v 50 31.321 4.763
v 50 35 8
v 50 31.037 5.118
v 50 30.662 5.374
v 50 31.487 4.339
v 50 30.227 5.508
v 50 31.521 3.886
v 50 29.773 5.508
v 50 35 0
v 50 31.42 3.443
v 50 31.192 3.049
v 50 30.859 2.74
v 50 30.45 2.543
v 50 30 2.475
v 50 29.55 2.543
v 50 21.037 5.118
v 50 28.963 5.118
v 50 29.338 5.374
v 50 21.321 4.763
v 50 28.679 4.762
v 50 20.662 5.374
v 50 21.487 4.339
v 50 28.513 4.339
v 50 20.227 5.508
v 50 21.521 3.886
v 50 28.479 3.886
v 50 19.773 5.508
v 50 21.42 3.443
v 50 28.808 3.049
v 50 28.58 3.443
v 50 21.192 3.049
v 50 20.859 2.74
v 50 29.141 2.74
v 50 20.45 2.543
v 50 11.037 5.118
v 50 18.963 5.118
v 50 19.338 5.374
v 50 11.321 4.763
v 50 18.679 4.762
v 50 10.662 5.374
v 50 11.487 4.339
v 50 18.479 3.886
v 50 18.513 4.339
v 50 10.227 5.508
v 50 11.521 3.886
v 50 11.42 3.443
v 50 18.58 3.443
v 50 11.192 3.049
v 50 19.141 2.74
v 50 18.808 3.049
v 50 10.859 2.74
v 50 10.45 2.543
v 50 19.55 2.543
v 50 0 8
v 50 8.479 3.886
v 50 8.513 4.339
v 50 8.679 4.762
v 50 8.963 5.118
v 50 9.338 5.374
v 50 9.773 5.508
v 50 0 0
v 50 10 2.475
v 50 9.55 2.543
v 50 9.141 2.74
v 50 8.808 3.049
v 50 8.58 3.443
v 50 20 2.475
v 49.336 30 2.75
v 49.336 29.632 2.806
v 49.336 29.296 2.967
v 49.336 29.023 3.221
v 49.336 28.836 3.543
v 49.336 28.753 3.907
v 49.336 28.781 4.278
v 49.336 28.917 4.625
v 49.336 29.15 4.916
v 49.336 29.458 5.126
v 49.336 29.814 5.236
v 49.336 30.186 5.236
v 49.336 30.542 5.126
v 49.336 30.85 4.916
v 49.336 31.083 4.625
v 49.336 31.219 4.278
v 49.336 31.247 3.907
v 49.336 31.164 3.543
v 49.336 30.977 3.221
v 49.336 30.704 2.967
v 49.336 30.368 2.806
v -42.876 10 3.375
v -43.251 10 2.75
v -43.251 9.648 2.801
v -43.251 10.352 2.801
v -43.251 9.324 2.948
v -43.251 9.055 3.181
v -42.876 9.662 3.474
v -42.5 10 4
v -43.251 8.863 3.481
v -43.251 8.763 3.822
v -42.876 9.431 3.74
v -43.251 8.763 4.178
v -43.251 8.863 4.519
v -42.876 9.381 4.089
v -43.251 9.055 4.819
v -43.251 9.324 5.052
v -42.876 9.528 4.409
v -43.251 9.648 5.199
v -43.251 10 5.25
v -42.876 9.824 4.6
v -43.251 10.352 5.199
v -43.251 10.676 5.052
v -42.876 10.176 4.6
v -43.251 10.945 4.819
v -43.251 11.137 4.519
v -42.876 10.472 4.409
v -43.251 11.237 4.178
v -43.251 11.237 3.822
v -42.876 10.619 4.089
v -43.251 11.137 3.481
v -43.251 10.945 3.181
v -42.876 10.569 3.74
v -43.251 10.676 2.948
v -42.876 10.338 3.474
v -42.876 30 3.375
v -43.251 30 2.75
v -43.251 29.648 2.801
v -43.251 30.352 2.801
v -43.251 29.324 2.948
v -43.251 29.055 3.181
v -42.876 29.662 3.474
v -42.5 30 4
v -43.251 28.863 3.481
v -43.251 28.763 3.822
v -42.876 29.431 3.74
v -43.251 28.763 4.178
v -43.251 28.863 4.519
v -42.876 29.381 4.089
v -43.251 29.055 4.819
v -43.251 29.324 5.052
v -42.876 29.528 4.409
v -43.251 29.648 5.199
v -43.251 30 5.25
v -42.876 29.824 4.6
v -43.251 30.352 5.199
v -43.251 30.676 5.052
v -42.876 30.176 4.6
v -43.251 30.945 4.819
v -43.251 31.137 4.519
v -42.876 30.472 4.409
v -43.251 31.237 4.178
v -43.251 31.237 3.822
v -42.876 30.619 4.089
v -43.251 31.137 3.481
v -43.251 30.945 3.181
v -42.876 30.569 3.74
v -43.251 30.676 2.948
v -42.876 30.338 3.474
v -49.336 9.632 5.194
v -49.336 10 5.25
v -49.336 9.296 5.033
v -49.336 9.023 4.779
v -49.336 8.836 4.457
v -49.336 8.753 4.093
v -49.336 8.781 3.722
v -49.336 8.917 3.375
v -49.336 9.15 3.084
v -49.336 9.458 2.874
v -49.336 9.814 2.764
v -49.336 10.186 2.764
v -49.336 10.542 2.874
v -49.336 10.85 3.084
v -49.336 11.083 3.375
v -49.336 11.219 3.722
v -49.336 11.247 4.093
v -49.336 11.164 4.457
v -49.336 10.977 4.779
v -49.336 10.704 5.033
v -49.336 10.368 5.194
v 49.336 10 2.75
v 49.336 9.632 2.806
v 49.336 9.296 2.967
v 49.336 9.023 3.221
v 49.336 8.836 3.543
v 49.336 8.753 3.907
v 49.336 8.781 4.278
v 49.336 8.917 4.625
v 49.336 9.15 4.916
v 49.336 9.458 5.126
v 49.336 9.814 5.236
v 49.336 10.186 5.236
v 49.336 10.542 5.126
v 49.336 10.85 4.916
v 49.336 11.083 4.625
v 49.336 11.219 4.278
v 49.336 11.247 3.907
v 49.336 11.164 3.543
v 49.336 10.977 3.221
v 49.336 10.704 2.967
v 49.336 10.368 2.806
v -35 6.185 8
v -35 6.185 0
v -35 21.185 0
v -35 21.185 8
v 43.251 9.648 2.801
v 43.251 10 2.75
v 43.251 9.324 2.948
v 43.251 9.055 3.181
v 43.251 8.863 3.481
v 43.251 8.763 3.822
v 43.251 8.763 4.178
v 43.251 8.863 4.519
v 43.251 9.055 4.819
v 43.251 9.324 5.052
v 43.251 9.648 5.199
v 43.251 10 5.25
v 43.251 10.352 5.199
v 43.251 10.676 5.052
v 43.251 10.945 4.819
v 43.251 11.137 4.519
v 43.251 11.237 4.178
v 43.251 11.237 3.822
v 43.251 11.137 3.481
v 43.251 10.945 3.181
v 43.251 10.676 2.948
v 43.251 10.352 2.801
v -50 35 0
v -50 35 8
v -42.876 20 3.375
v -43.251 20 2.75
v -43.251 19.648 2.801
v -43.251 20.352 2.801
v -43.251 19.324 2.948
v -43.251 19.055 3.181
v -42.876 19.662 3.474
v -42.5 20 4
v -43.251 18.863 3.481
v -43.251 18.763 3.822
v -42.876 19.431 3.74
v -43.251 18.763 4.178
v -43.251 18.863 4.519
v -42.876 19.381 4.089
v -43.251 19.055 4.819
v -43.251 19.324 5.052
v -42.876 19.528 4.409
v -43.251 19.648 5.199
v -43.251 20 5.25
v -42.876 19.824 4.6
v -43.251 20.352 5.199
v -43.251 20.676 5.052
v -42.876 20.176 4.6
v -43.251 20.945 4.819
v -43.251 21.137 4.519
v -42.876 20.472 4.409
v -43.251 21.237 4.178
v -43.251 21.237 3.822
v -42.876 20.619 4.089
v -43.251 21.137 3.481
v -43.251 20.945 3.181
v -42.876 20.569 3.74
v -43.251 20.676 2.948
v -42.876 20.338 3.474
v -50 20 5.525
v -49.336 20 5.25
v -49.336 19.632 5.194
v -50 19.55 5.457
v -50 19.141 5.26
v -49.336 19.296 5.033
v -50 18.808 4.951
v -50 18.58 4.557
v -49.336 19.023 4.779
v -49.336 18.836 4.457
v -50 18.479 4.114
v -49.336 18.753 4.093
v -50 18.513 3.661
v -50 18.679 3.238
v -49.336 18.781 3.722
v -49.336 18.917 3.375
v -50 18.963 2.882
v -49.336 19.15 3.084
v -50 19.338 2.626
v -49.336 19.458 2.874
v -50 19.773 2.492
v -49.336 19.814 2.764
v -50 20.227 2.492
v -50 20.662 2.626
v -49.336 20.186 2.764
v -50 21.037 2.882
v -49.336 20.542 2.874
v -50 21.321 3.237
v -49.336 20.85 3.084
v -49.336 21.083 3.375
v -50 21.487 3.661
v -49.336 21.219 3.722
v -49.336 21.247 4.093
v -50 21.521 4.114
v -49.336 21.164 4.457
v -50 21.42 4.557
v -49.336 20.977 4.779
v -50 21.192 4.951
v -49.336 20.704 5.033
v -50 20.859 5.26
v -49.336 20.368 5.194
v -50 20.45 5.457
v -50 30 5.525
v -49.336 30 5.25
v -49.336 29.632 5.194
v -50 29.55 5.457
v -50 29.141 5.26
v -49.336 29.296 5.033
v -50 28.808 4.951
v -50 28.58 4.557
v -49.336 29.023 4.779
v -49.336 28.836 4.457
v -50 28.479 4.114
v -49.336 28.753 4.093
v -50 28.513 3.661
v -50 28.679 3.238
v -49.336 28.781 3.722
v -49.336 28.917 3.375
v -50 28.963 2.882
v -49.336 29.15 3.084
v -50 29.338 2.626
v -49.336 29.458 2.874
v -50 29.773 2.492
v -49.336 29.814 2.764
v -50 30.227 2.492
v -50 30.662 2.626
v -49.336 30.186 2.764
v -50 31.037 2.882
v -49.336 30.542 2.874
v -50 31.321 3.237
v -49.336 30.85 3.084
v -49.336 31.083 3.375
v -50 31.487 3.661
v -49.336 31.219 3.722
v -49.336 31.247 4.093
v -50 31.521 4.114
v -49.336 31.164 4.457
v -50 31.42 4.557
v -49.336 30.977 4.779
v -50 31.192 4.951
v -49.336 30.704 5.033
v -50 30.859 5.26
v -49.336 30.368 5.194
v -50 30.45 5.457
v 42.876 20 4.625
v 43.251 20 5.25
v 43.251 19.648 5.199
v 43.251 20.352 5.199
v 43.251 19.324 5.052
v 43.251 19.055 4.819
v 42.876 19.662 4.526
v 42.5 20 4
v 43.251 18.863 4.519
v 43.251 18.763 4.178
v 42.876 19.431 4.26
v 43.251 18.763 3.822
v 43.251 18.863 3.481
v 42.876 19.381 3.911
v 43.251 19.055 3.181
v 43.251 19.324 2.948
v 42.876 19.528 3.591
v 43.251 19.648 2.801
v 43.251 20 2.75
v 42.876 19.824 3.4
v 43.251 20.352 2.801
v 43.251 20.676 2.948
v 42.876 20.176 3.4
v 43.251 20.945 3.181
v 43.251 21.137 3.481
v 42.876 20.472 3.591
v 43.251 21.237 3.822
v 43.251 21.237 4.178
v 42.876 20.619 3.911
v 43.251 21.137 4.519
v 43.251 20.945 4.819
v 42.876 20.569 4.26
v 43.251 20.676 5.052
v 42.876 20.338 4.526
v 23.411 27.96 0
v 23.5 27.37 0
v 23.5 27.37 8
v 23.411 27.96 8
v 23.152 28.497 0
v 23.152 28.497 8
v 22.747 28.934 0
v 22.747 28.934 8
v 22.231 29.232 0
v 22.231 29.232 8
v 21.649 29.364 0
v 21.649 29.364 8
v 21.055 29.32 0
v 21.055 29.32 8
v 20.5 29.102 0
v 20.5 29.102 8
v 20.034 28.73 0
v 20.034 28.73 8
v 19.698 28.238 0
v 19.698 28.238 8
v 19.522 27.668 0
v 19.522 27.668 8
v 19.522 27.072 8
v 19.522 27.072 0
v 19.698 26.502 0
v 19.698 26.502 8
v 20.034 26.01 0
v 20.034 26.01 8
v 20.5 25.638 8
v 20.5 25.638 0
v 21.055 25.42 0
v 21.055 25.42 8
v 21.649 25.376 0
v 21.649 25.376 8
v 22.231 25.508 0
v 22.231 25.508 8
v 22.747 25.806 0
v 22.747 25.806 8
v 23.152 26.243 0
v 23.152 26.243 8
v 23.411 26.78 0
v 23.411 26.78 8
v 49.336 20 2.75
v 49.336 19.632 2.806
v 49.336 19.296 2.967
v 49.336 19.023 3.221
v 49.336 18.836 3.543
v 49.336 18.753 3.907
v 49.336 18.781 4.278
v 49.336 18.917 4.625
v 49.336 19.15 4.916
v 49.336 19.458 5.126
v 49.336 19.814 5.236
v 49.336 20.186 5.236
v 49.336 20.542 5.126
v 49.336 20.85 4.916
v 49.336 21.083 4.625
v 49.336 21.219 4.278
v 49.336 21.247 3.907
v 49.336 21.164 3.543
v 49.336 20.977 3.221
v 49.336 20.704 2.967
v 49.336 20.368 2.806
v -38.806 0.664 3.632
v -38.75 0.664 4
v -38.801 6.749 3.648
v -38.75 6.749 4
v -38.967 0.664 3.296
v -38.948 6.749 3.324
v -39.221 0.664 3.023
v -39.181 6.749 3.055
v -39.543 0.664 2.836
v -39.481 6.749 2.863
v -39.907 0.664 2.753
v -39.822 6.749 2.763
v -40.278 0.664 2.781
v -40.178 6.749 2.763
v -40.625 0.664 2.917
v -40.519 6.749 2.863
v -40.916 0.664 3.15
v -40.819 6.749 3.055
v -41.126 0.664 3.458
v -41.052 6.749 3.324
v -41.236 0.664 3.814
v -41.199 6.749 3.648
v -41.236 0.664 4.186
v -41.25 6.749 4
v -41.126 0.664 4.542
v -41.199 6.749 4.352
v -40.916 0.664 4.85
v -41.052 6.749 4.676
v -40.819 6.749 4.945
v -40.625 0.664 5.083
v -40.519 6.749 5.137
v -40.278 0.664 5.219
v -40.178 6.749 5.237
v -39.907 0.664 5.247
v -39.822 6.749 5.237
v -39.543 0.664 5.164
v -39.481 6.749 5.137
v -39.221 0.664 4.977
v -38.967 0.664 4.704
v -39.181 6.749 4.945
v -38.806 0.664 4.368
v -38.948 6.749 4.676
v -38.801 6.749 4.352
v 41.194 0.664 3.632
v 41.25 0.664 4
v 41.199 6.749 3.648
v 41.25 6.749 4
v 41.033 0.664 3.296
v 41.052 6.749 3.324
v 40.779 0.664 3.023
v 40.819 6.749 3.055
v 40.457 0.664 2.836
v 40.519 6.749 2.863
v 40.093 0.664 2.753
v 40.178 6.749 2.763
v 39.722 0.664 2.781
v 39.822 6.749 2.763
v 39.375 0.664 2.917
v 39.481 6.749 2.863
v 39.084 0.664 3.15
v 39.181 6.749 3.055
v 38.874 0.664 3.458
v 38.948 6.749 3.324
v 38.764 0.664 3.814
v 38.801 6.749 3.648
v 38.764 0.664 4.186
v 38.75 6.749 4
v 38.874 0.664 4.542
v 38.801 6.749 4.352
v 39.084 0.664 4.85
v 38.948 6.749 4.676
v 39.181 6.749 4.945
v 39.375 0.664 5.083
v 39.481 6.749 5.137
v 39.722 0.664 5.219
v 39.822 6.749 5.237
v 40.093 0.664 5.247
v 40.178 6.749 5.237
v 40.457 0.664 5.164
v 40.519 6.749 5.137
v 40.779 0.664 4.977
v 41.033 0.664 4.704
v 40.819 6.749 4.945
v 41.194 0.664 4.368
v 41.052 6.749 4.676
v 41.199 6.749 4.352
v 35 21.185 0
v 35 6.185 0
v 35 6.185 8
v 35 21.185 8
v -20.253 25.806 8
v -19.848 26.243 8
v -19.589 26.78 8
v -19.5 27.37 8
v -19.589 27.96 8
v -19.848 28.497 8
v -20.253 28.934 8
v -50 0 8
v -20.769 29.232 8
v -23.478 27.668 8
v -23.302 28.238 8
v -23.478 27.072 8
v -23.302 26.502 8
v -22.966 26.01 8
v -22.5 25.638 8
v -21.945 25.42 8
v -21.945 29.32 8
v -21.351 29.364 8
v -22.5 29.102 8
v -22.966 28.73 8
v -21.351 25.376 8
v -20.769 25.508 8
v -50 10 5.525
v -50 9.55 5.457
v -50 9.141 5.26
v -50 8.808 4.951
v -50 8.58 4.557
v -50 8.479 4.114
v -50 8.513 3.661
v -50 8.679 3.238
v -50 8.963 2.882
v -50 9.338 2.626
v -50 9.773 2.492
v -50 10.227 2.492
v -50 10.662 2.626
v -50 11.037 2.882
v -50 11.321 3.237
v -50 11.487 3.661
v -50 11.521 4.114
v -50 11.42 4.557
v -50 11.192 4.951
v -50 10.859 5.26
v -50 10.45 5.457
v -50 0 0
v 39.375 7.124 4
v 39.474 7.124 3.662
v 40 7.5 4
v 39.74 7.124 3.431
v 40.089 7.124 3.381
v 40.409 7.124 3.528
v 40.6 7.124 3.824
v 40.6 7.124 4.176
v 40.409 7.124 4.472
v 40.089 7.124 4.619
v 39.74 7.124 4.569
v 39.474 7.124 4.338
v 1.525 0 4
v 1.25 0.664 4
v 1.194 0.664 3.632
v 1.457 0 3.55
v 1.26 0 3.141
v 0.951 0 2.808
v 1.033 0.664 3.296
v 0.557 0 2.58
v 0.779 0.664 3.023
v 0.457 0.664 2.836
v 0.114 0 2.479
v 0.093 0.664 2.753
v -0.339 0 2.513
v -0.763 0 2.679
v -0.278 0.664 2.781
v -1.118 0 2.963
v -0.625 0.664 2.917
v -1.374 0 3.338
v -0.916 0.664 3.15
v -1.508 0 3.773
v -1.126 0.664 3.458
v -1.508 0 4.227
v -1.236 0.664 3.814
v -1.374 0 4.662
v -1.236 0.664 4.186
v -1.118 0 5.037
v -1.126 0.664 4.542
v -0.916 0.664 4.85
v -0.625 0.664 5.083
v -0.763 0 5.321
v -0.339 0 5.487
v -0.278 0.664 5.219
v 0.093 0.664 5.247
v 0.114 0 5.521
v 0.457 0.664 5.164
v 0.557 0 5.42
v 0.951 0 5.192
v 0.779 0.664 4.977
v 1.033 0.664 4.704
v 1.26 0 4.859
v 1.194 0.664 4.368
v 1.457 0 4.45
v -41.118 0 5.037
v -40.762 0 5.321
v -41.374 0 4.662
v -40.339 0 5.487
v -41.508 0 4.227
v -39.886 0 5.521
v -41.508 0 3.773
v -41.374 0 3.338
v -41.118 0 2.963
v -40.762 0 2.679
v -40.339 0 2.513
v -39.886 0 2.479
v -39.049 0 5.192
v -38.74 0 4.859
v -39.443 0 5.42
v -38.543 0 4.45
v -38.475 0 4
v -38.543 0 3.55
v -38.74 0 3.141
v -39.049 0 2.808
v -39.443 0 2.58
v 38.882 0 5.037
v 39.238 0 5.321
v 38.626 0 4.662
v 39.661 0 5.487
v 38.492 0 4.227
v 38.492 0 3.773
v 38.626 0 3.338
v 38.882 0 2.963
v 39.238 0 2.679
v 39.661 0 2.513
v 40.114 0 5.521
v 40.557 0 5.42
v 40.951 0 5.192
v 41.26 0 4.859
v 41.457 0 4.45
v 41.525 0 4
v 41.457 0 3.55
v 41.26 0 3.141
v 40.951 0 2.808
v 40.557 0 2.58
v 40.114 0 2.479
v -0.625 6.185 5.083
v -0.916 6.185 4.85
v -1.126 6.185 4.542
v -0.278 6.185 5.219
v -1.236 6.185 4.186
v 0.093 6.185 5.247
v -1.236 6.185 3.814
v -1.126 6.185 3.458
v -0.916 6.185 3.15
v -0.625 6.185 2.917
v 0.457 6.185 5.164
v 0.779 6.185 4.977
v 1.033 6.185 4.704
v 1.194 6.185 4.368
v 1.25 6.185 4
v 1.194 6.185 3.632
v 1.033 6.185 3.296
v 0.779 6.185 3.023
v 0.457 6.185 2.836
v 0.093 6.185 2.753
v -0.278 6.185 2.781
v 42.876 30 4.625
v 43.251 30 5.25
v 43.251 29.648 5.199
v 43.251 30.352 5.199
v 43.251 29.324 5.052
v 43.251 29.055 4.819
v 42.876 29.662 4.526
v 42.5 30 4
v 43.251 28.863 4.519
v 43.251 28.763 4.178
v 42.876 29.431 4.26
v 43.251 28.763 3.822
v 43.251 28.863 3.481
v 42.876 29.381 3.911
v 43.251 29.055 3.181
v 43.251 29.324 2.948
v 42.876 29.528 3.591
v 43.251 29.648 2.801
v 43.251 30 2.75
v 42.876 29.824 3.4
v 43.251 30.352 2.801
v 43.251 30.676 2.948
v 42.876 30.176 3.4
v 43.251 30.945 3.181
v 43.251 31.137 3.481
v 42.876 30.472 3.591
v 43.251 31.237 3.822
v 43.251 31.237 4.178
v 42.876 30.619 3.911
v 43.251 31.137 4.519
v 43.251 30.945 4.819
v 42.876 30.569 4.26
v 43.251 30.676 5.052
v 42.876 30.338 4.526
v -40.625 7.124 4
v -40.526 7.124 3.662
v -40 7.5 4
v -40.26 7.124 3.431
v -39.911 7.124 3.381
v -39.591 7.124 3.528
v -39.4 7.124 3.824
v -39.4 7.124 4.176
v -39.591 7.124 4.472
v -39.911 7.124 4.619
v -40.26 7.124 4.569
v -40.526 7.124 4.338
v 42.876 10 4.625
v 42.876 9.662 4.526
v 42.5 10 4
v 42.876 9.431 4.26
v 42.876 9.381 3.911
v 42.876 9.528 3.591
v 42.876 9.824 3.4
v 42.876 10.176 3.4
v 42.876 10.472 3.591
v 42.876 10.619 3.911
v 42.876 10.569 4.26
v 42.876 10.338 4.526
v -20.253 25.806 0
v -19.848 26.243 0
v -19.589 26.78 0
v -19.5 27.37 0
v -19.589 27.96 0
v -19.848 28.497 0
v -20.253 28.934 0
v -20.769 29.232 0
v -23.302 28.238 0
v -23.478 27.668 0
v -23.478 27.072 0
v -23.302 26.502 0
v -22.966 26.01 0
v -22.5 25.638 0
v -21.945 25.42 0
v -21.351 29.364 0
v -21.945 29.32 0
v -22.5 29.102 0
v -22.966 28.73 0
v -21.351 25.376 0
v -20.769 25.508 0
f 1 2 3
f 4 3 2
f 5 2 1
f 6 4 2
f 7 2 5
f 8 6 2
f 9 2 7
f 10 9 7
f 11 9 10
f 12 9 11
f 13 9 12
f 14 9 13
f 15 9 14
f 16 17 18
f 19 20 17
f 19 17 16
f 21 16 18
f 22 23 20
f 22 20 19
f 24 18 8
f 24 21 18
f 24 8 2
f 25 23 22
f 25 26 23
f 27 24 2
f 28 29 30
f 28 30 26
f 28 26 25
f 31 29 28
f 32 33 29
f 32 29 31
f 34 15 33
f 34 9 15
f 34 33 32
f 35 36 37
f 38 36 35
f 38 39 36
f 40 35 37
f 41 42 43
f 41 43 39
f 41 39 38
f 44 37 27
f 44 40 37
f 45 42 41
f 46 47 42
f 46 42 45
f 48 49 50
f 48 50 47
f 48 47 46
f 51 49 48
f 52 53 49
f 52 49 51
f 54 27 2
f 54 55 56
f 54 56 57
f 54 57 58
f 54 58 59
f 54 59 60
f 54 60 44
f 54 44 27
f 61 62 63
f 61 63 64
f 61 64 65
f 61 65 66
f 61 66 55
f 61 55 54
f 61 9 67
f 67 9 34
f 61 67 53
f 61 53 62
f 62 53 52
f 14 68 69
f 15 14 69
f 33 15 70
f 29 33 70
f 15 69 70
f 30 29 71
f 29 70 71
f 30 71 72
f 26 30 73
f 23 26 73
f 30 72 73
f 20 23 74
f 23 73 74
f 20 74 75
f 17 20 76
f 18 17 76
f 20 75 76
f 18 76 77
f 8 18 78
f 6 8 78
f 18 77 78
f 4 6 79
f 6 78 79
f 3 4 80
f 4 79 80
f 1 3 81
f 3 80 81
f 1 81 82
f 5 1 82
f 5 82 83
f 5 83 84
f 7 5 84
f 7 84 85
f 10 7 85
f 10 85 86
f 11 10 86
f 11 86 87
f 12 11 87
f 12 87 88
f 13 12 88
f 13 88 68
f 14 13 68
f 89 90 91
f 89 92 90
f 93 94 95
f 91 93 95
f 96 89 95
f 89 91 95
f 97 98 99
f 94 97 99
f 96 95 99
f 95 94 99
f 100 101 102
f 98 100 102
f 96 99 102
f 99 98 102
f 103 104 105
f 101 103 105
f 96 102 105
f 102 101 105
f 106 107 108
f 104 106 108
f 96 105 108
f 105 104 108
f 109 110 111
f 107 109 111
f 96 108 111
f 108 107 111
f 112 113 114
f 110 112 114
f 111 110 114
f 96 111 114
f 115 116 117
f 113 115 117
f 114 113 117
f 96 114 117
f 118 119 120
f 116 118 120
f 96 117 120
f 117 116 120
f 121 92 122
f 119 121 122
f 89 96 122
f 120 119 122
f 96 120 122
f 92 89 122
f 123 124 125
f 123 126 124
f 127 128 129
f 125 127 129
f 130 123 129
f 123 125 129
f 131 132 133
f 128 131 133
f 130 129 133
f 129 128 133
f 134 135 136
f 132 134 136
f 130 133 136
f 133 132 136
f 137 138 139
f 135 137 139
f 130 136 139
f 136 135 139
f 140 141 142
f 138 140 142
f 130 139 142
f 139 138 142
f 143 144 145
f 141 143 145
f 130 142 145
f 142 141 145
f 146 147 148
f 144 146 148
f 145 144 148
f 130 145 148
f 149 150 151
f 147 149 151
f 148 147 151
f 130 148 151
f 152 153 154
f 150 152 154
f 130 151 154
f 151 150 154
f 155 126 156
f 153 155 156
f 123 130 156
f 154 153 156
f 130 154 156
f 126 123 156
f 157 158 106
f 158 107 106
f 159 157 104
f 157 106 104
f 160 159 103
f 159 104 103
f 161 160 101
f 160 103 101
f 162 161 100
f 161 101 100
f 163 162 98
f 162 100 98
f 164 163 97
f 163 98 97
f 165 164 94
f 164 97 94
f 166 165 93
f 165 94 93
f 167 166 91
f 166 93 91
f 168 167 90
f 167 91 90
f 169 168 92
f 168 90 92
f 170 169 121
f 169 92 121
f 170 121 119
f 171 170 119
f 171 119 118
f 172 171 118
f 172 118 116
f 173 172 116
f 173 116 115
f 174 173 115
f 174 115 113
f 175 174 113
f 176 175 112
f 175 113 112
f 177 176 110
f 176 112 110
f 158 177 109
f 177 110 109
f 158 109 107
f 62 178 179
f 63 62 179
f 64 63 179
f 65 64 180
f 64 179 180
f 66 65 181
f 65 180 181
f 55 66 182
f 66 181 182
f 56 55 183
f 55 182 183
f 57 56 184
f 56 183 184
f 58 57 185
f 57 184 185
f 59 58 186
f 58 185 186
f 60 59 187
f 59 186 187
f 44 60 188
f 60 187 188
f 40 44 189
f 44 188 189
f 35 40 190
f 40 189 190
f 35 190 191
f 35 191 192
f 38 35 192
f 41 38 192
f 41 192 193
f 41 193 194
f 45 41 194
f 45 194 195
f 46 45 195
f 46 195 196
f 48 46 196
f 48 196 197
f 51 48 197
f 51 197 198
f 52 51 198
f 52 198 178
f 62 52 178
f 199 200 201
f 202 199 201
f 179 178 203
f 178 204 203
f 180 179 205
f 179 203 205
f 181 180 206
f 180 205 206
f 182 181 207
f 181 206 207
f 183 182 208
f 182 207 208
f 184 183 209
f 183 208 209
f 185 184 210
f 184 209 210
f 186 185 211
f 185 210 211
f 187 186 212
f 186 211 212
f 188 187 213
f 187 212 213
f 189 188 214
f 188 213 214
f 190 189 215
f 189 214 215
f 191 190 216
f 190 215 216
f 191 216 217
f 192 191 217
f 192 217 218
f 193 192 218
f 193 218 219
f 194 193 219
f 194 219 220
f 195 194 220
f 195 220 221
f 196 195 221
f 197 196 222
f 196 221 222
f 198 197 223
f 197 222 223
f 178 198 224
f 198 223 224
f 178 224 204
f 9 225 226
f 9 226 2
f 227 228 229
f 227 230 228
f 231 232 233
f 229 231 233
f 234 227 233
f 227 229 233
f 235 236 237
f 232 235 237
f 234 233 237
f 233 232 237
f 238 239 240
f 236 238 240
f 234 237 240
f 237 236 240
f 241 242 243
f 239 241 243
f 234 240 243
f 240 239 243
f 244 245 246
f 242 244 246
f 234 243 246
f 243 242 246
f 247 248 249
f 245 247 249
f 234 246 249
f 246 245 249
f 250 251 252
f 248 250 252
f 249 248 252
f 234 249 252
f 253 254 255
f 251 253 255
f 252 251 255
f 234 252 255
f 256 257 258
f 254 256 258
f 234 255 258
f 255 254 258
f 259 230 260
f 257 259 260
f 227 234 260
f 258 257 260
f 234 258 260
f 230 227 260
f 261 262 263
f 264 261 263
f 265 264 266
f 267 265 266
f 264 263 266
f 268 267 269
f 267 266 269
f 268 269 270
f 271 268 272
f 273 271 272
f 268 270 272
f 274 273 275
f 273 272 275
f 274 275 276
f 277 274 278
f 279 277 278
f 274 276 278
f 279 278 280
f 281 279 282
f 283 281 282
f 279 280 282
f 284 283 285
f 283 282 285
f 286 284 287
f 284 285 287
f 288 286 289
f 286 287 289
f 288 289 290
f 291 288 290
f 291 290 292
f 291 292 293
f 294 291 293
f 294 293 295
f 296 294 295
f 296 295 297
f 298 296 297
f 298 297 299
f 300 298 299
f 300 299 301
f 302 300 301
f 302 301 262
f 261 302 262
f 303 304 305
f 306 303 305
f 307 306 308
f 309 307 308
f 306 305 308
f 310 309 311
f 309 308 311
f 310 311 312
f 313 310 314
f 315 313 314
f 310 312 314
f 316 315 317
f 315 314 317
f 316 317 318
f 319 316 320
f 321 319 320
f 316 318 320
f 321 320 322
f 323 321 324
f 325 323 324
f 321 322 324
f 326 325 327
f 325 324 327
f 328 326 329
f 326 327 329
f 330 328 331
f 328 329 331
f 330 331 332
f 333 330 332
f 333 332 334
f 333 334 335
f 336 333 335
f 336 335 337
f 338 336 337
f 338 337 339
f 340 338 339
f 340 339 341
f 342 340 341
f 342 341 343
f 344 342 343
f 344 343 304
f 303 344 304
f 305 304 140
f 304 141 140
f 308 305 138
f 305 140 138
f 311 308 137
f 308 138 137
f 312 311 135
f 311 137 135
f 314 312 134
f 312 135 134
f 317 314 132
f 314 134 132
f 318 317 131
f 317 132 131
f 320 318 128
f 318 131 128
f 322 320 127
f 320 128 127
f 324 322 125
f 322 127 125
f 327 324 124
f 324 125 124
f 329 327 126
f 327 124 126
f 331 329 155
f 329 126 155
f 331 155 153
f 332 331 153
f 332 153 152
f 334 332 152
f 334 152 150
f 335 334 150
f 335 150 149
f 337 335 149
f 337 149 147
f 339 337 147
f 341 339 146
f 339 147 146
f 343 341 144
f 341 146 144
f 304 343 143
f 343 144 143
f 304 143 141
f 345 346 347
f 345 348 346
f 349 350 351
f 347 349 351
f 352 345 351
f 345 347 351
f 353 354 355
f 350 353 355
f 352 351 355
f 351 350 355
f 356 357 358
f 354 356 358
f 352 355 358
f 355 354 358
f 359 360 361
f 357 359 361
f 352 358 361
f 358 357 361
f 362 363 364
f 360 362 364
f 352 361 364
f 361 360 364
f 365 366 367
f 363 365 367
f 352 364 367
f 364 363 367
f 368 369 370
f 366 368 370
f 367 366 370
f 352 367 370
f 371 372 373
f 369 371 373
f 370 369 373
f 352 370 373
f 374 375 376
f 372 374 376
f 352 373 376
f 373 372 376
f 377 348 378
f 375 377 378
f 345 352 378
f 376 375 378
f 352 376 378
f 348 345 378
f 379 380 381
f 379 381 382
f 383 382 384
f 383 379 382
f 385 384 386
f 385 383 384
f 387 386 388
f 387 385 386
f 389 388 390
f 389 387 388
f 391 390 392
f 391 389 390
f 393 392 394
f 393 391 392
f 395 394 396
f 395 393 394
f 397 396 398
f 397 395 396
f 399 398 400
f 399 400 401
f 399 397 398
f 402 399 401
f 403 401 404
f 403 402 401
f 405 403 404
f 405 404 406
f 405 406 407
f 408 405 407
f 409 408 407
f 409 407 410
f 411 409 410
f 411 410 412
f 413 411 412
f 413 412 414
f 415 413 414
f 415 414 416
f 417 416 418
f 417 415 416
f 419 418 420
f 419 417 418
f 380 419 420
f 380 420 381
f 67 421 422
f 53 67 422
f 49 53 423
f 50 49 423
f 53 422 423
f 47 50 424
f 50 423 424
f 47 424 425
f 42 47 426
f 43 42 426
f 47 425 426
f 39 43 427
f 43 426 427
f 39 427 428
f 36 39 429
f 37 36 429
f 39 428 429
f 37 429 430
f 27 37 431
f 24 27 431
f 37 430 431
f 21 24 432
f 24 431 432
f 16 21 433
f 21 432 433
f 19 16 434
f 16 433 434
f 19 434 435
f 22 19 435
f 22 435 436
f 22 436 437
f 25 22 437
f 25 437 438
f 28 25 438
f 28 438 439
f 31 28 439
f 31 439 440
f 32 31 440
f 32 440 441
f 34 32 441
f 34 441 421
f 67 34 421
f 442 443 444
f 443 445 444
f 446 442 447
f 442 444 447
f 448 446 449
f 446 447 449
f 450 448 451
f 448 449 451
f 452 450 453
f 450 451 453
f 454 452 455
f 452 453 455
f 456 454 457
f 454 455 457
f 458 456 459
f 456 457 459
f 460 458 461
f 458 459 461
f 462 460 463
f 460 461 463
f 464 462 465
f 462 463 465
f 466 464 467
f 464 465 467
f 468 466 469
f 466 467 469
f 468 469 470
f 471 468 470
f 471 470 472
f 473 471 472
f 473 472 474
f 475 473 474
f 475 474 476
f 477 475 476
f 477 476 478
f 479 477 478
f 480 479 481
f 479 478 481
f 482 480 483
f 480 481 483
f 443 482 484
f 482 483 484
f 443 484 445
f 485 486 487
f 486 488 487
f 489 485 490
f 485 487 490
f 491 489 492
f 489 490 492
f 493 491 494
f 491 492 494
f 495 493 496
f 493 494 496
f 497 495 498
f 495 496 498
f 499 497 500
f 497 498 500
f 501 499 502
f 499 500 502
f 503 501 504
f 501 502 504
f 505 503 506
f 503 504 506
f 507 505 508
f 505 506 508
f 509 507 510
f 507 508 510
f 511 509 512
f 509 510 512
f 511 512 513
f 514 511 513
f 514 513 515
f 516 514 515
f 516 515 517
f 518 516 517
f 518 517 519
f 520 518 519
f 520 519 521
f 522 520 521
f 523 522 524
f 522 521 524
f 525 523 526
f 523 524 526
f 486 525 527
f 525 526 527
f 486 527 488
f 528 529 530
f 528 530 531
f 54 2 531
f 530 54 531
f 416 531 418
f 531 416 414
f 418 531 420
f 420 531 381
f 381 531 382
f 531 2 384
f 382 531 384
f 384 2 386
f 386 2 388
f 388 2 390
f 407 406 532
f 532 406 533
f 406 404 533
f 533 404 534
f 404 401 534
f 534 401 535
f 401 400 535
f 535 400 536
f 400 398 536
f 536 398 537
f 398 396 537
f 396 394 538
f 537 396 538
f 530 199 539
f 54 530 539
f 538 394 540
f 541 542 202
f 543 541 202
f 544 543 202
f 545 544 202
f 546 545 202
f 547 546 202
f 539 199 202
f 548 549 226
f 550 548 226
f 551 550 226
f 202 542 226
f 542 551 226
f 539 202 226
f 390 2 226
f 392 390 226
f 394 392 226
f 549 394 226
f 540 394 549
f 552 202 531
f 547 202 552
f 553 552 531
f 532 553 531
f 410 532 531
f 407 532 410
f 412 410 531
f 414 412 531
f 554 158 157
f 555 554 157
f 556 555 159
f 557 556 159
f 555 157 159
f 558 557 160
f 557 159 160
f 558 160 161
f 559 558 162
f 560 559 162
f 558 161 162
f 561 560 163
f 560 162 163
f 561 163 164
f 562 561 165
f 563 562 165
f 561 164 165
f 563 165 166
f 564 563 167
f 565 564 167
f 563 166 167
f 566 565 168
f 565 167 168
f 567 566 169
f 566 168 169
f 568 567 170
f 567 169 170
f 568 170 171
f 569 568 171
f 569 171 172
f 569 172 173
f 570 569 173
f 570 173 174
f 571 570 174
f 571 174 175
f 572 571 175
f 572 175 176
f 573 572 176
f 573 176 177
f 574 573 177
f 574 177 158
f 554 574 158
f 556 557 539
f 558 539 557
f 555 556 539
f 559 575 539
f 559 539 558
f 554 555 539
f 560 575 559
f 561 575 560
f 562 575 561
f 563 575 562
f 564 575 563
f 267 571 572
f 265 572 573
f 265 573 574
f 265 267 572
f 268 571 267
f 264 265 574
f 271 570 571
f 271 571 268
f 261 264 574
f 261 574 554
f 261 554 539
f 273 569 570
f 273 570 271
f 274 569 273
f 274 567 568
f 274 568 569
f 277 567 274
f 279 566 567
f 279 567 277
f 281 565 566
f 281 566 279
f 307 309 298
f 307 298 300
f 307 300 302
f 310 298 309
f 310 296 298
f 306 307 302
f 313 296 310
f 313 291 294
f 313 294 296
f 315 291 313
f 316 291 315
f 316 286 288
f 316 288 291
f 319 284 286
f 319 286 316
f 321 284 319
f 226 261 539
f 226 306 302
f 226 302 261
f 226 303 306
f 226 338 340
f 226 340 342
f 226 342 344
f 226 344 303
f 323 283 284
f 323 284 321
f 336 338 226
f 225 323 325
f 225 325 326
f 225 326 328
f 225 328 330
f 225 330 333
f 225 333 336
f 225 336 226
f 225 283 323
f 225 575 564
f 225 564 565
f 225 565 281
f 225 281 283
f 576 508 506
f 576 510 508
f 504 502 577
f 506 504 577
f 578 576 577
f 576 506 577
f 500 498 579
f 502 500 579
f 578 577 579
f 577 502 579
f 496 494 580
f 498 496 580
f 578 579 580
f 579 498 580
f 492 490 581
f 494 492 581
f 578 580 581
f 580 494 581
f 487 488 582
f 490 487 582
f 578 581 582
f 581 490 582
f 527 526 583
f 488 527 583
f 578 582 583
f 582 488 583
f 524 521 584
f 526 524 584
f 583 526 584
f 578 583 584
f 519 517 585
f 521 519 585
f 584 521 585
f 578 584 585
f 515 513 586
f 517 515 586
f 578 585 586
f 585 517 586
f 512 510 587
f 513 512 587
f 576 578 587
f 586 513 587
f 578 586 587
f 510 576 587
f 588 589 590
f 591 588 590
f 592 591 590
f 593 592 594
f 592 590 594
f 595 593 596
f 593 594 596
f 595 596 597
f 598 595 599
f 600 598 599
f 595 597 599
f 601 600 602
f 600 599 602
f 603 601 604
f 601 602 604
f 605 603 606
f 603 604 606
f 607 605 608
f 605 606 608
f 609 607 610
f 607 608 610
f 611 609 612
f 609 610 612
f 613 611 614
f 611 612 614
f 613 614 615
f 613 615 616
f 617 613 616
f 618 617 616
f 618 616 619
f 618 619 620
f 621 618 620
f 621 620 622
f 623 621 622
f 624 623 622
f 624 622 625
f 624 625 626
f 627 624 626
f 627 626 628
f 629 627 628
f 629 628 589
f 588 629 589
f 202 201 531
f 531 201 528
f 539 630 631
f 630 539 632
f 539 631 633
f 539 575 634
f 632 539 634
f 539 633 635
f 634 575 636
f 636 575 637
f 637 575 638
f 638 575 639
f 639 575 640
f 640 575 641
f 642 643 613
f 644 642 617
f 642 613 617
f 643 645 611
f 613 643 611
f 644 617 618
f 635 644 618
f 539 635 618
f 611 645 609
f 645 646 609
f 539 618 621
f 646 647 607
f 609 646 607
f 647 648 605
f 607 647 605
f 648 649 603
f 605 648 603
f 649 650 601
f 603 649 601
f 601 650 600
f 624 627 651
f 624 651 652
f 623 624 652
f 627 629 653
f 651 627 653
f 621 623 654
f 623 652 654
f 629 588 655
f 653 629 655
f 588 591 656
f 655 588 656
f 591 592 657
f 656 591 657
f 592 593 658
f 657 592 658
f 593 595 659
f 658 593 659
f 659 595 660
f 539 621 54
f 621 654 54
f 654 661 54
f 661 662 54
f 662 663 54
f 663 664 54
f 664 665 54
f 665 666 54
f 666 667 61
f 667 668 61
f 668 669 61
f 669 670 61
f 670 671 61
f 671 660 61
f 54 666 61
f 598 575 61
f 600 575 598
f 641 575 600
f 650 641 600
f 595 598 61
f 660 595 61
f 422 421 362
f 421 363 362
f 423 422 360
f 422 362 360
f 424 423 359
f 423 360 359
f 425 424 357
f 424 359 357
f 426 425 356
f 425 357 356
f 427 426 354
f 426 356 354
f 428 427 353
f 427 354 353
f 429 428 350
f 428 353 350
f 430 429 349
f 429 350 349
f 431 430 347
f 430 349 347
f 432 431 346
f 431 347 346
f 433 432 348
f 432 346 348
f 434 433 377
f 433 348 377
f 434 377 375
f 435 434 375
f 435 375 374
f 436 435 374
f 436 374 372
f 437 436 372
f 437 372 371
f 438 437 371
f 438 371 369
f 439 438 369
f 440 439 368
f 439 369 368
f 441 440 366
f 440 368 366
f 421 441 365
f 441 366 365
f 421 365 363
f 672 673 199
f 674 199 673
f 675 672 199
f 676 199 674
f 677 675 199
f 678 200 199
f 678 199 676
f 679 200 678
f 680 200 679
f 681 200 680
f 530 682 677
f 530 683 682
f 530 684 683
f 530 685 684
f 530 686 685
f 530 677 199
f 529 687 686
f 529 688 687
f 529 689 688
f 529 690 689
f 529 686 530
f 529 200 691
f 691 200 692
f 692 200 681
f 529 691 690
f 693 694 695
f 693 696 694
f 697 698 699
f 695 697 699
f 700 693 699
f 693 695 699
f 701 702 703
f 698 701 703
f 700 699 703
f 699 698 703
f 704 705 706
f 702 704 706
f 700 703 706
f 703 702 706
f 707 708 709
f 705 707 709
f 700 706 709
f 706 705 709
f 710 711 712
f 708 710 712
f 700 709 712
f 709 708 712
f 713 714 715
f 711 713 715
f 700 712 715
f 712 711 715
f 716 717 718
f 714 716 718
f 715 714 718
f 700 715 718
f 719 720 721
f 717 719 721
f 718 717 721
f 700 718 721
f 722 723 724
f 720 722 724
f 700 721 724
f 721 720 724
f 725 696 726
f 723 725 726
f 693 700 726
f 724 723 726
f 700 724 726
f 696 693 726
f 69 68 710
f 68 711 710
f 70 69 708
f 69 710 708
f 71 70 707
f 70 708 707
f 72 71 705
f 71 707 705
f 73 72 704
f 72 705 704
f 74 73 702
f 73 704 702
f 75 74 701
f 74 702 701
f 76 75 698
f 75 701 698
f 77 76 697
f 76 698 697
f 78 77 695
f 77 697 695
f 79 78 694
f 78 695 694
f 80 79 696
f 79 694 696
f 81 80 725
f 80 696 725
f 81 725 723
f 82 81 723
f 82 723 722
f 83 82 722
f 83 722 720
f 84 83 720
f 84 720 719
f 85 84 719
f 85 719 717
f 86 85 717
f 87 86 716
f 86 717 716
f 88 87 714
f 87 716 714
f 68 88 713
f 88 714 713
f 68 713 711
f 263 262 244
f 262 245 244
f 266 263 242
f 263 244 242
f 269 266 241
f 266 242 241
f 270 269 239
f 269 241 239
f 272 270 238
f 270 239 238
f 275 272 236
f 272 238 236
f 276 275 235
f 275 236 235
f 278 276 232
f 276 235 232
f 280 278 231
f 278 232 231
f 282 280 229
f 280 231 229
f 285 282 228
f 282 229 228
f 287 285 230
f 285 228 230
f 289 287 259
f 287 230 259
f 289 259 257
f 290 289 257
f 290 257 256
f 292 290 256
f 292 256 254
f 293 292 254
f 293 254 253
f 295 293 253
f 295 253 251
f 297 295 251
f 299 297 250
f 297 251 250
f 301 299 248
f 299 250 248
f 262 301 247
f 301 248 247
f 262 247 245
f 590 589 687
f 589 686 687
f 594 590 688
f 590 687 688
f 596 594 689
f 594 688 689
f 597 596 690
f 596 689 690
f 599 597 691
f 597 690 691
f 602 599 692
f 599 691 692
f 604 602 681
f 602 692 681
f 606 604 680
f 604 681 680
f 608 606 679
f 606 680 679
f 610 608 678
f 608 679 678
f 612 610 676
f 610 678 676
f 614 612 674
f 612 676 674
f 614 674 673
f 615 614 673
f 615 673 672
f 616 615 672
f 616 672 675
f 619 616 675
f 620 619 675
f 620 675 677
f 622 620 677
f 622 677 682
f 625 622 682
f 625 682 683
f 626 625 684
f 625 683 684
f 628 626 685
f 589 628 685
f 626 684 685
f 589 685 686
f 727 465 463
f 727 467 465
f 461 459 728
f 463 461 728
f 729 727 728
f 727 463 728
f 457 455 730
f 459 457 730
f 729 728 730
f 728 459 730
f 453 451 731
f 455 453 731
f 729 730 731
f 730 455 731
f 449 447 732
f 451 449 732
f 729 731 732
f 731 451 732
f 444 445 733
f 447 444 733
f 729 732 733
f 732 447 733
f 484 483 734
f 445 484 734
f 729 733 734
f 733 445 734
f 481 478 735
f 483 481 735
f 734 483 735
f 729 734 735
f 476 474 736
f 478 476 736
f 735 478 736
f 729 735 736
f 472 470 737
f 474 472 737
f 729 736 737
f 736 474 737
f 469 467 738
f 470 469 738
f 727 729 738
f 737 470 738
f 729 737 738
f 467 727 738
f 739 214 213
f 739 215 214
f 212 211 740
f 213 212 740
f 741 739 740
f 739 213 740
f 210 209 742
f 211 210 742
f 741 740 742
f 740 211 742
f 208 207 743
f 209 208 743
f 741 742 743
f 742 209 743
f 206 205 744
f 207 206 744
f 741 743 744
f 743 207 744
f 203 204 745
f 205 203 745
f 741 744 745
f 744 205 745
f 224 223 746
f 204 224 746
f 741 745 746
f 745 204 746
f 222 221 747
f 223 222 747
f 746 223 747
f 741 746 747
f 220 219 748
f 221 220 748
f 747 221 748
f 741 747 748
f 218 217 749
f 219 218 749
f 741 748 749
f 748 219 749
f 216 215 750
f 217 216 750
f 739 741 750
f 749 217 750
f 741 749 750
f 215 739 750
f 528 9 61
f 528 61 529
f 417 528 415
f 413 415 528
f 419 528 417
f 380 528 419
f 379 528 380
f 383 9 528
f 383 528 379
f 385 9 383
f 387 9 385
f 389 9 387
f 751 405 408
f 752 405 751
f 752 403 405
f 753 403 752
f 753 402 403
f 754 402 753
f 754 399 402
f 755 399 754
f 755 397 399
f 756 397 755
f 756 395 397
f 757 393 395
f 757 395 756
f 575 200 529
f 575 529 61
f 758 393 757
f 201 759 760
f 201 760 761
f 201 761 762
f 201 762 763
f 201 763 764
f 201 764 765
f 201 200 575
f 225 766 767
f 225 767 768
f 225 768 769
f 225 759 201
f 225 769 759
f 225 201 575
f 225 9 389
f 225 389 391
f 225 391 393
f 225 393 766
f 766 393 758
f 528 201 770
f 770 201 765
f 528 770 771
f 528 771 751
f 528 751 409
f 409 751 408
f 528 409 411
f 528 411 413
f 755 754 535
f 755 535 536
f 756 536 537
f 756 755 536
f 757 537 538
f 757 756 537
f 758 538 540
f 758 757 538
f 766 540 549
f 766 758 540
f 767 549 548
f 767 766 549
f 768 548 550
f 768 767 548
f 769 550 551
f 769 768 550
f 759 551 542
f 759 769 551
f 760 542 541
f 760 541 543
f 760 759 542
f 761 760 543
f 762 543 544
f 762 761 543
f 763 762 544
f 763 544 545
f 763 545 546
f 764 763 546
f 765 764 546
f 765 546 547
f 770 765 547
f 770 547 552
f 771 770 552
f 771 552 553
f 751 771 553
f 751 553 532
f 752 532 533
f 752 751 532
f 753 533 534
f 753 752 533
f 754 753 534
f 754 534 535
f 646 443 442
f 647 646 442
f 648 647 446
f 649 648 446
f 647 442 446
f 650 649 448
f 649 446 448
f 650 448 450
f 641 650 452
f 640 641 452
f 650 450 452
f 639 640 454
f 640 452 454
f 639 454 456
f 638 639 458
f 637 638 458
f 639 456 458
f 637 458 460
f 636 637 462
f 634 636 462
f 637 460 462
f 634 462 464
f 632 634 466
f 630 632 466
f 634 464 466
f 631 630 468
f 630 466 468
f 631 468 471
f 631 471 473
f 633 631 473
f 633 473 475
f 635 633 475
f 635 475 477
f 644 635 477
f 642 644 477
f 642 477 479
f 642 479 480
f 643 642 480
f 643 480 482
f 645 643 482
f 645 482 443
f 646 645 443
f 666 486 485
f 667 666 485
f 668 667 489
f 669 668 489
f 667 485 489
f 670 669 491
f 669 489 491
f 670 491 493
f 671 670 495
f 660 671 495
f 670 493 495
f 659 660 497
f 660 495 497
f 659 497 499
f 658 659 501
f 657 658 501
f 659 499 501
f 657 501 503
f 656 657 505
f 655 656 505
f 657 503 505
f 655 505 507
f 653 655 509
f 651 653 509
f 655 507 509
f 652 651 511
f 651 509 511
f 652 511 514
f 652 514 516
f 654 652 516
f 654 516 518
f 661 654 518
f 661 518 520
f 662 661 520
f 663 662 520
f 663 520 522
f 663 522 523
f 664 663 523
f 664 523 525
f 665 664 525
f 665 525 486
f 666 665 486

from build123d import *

# Parameters (mm, degrees)
SKETCH_1_R                   = 2
SKETCH_1_W                   = 70
SKETCH_1_H                   = 15
EXTRUDE_2_DEPTH              = 8
HOLE_WIZARD_M3_1_D           = 2.5
HOLE_WIZARD_M3_1_DEPTH       = 6.748924226
HOLE_WIZARD_M3_1_CSINK_D     = 3.05
HOLE_WIZARD_M3_1_CSINK_ANGLE = 45
HOLE_WIZARD_M3_1_TIP         = 0.751075774
HOLE_WIZARD_M3_2_D           = 2.5
HOLE_WIZARD_M3_2_DEPTH       = 6.748924226
HOLE_WIZARD_M3_2_CSINK_D     = 3.05
HOLE_WIZARD_M3_2_CSINK_ANGLE = 45
HOLE_WIZARD_M3_2_TIP         = 0.751075774
HOLE_WIZARD_M3_3_D           = 2.5
HOLE_WIZARD_M3_3_DEPTH       = 6.748924226
HOLE_WIZARD_M3_3_CSINK_D     = 3.05
HOLE_WIZARD_M3_3_CSINK_ANGLE = 45
HOLE_WIZARD_M3_3_TIP         = 0.751075774


with BuildPart() as part:
    # 草圖1 → 填料-伸長2 (new body)
    with BuildSketch(Plane.XY):
        Polygon((0, 0), (-50, 0), (-50, 35), (50, 35), (50, 0), align=None)
        with Locations((-21.5, 27.37)):
            Circle(SKETCH_1_R, mode=Mode.SUBTRACT)
        with Locations((21.5, 27.37)):
            Circle(SKETCH_1_R, mode=Mode.SUBTRACT)
        with Locations((0, 13.685)):
            Rectangle(SKETCH_1_W, SKETCH_1_H, mode=Mode.SUBTRACT)
    extrude(amount=EXTRUDE_2_DEPTH)

    # M3 螺紋孔1
    with Locations(Plane(origin=(50, 10, 4), x_dir=(0, 0, 1), z_dir=(1, 0, 0))):
        with Locations((0, 0), (0, -20), (0, -10)):
            CounterSinkHole(HOLE_WIZARD_M3_1_D / 2, HOLE_WIZARD_M3_1_CSINK_D / 2, depth=HOLE_WIZARD_M3_1_DEPTH, counter_sink_angle=HOLE_WIZARD_M3_1_CSINK_ANGLE)
            with Locations((0, 0, -(HOLE_WIZARD_M3_1_DEPTH + HOLE_WIZARD_M3_1_TIP / 2))):  # 118° drill point
                Cone(0, HOLE_WIZARD_M3_1_D / 2, HOLE_WIZARD_M3_1_TIP, mode=Mode.SUBTRACT)

    # M3 螺紋孔2
    with Locations(Plane(origin=(-50, 30, 4), x_dir=(0, 0, -1), z_dir=(-1, 0, 0))):
        with Locations((0, 0), (0, 10), (0, 20)):
            CounterSinkHole(HOLE_WIZARD_M3_2_D / 2, HOLE_WIZARD_M3_2_CSINK_D / 2, depth=HOLE_WIZARD_M3_2_DEPTH, counter_sink_angle=HOLE_WIZARD_M3_2_CSINK_ANGLE)
            with Locations((0, 0, -(HOLE_WIZARD_M3_2_DEPTH + HOLE_WIZARD_M3_2_TIP / 2))):  # 118° drill point
                Cone(0, HOLE_WIZARD_M3_2_D / 2, HOLE_WIZARD_M3_2_TIP, mode=Mode.SUBTRACT)

    # M3 螺紋孔3
    with Locations(Plane(origin=(40, 0, 4), x_dir=(-1, 0, 0), z_dir=(0, -1, 0))):
        with Locations((0, 0), (40, 0), (80, 0)):
            CounterSinkHole(HOLE_WIZARD_M3_3_D / 2, HOLE_WIZARD_M3_3_CSINK_D / 2, depth=HOLE_WIZARD_M3_3_DEPTH, counter_sink_angle=HOLE_WIZARD_M3_3_CSINK_ANGLE)
            with Locations((0, 0, -(HOLE_WIZARD_M3_3_DEPTH + HOLE_WIZARD_M3_3_TIP / 2))):  # 118° drill point
                Cone(0, HOLE_WIZARD_M3_3_D / 2, HOLE_WIZARD_M3_3_TIP, mode=Mode.SUBTRACT)


solid = part.part
